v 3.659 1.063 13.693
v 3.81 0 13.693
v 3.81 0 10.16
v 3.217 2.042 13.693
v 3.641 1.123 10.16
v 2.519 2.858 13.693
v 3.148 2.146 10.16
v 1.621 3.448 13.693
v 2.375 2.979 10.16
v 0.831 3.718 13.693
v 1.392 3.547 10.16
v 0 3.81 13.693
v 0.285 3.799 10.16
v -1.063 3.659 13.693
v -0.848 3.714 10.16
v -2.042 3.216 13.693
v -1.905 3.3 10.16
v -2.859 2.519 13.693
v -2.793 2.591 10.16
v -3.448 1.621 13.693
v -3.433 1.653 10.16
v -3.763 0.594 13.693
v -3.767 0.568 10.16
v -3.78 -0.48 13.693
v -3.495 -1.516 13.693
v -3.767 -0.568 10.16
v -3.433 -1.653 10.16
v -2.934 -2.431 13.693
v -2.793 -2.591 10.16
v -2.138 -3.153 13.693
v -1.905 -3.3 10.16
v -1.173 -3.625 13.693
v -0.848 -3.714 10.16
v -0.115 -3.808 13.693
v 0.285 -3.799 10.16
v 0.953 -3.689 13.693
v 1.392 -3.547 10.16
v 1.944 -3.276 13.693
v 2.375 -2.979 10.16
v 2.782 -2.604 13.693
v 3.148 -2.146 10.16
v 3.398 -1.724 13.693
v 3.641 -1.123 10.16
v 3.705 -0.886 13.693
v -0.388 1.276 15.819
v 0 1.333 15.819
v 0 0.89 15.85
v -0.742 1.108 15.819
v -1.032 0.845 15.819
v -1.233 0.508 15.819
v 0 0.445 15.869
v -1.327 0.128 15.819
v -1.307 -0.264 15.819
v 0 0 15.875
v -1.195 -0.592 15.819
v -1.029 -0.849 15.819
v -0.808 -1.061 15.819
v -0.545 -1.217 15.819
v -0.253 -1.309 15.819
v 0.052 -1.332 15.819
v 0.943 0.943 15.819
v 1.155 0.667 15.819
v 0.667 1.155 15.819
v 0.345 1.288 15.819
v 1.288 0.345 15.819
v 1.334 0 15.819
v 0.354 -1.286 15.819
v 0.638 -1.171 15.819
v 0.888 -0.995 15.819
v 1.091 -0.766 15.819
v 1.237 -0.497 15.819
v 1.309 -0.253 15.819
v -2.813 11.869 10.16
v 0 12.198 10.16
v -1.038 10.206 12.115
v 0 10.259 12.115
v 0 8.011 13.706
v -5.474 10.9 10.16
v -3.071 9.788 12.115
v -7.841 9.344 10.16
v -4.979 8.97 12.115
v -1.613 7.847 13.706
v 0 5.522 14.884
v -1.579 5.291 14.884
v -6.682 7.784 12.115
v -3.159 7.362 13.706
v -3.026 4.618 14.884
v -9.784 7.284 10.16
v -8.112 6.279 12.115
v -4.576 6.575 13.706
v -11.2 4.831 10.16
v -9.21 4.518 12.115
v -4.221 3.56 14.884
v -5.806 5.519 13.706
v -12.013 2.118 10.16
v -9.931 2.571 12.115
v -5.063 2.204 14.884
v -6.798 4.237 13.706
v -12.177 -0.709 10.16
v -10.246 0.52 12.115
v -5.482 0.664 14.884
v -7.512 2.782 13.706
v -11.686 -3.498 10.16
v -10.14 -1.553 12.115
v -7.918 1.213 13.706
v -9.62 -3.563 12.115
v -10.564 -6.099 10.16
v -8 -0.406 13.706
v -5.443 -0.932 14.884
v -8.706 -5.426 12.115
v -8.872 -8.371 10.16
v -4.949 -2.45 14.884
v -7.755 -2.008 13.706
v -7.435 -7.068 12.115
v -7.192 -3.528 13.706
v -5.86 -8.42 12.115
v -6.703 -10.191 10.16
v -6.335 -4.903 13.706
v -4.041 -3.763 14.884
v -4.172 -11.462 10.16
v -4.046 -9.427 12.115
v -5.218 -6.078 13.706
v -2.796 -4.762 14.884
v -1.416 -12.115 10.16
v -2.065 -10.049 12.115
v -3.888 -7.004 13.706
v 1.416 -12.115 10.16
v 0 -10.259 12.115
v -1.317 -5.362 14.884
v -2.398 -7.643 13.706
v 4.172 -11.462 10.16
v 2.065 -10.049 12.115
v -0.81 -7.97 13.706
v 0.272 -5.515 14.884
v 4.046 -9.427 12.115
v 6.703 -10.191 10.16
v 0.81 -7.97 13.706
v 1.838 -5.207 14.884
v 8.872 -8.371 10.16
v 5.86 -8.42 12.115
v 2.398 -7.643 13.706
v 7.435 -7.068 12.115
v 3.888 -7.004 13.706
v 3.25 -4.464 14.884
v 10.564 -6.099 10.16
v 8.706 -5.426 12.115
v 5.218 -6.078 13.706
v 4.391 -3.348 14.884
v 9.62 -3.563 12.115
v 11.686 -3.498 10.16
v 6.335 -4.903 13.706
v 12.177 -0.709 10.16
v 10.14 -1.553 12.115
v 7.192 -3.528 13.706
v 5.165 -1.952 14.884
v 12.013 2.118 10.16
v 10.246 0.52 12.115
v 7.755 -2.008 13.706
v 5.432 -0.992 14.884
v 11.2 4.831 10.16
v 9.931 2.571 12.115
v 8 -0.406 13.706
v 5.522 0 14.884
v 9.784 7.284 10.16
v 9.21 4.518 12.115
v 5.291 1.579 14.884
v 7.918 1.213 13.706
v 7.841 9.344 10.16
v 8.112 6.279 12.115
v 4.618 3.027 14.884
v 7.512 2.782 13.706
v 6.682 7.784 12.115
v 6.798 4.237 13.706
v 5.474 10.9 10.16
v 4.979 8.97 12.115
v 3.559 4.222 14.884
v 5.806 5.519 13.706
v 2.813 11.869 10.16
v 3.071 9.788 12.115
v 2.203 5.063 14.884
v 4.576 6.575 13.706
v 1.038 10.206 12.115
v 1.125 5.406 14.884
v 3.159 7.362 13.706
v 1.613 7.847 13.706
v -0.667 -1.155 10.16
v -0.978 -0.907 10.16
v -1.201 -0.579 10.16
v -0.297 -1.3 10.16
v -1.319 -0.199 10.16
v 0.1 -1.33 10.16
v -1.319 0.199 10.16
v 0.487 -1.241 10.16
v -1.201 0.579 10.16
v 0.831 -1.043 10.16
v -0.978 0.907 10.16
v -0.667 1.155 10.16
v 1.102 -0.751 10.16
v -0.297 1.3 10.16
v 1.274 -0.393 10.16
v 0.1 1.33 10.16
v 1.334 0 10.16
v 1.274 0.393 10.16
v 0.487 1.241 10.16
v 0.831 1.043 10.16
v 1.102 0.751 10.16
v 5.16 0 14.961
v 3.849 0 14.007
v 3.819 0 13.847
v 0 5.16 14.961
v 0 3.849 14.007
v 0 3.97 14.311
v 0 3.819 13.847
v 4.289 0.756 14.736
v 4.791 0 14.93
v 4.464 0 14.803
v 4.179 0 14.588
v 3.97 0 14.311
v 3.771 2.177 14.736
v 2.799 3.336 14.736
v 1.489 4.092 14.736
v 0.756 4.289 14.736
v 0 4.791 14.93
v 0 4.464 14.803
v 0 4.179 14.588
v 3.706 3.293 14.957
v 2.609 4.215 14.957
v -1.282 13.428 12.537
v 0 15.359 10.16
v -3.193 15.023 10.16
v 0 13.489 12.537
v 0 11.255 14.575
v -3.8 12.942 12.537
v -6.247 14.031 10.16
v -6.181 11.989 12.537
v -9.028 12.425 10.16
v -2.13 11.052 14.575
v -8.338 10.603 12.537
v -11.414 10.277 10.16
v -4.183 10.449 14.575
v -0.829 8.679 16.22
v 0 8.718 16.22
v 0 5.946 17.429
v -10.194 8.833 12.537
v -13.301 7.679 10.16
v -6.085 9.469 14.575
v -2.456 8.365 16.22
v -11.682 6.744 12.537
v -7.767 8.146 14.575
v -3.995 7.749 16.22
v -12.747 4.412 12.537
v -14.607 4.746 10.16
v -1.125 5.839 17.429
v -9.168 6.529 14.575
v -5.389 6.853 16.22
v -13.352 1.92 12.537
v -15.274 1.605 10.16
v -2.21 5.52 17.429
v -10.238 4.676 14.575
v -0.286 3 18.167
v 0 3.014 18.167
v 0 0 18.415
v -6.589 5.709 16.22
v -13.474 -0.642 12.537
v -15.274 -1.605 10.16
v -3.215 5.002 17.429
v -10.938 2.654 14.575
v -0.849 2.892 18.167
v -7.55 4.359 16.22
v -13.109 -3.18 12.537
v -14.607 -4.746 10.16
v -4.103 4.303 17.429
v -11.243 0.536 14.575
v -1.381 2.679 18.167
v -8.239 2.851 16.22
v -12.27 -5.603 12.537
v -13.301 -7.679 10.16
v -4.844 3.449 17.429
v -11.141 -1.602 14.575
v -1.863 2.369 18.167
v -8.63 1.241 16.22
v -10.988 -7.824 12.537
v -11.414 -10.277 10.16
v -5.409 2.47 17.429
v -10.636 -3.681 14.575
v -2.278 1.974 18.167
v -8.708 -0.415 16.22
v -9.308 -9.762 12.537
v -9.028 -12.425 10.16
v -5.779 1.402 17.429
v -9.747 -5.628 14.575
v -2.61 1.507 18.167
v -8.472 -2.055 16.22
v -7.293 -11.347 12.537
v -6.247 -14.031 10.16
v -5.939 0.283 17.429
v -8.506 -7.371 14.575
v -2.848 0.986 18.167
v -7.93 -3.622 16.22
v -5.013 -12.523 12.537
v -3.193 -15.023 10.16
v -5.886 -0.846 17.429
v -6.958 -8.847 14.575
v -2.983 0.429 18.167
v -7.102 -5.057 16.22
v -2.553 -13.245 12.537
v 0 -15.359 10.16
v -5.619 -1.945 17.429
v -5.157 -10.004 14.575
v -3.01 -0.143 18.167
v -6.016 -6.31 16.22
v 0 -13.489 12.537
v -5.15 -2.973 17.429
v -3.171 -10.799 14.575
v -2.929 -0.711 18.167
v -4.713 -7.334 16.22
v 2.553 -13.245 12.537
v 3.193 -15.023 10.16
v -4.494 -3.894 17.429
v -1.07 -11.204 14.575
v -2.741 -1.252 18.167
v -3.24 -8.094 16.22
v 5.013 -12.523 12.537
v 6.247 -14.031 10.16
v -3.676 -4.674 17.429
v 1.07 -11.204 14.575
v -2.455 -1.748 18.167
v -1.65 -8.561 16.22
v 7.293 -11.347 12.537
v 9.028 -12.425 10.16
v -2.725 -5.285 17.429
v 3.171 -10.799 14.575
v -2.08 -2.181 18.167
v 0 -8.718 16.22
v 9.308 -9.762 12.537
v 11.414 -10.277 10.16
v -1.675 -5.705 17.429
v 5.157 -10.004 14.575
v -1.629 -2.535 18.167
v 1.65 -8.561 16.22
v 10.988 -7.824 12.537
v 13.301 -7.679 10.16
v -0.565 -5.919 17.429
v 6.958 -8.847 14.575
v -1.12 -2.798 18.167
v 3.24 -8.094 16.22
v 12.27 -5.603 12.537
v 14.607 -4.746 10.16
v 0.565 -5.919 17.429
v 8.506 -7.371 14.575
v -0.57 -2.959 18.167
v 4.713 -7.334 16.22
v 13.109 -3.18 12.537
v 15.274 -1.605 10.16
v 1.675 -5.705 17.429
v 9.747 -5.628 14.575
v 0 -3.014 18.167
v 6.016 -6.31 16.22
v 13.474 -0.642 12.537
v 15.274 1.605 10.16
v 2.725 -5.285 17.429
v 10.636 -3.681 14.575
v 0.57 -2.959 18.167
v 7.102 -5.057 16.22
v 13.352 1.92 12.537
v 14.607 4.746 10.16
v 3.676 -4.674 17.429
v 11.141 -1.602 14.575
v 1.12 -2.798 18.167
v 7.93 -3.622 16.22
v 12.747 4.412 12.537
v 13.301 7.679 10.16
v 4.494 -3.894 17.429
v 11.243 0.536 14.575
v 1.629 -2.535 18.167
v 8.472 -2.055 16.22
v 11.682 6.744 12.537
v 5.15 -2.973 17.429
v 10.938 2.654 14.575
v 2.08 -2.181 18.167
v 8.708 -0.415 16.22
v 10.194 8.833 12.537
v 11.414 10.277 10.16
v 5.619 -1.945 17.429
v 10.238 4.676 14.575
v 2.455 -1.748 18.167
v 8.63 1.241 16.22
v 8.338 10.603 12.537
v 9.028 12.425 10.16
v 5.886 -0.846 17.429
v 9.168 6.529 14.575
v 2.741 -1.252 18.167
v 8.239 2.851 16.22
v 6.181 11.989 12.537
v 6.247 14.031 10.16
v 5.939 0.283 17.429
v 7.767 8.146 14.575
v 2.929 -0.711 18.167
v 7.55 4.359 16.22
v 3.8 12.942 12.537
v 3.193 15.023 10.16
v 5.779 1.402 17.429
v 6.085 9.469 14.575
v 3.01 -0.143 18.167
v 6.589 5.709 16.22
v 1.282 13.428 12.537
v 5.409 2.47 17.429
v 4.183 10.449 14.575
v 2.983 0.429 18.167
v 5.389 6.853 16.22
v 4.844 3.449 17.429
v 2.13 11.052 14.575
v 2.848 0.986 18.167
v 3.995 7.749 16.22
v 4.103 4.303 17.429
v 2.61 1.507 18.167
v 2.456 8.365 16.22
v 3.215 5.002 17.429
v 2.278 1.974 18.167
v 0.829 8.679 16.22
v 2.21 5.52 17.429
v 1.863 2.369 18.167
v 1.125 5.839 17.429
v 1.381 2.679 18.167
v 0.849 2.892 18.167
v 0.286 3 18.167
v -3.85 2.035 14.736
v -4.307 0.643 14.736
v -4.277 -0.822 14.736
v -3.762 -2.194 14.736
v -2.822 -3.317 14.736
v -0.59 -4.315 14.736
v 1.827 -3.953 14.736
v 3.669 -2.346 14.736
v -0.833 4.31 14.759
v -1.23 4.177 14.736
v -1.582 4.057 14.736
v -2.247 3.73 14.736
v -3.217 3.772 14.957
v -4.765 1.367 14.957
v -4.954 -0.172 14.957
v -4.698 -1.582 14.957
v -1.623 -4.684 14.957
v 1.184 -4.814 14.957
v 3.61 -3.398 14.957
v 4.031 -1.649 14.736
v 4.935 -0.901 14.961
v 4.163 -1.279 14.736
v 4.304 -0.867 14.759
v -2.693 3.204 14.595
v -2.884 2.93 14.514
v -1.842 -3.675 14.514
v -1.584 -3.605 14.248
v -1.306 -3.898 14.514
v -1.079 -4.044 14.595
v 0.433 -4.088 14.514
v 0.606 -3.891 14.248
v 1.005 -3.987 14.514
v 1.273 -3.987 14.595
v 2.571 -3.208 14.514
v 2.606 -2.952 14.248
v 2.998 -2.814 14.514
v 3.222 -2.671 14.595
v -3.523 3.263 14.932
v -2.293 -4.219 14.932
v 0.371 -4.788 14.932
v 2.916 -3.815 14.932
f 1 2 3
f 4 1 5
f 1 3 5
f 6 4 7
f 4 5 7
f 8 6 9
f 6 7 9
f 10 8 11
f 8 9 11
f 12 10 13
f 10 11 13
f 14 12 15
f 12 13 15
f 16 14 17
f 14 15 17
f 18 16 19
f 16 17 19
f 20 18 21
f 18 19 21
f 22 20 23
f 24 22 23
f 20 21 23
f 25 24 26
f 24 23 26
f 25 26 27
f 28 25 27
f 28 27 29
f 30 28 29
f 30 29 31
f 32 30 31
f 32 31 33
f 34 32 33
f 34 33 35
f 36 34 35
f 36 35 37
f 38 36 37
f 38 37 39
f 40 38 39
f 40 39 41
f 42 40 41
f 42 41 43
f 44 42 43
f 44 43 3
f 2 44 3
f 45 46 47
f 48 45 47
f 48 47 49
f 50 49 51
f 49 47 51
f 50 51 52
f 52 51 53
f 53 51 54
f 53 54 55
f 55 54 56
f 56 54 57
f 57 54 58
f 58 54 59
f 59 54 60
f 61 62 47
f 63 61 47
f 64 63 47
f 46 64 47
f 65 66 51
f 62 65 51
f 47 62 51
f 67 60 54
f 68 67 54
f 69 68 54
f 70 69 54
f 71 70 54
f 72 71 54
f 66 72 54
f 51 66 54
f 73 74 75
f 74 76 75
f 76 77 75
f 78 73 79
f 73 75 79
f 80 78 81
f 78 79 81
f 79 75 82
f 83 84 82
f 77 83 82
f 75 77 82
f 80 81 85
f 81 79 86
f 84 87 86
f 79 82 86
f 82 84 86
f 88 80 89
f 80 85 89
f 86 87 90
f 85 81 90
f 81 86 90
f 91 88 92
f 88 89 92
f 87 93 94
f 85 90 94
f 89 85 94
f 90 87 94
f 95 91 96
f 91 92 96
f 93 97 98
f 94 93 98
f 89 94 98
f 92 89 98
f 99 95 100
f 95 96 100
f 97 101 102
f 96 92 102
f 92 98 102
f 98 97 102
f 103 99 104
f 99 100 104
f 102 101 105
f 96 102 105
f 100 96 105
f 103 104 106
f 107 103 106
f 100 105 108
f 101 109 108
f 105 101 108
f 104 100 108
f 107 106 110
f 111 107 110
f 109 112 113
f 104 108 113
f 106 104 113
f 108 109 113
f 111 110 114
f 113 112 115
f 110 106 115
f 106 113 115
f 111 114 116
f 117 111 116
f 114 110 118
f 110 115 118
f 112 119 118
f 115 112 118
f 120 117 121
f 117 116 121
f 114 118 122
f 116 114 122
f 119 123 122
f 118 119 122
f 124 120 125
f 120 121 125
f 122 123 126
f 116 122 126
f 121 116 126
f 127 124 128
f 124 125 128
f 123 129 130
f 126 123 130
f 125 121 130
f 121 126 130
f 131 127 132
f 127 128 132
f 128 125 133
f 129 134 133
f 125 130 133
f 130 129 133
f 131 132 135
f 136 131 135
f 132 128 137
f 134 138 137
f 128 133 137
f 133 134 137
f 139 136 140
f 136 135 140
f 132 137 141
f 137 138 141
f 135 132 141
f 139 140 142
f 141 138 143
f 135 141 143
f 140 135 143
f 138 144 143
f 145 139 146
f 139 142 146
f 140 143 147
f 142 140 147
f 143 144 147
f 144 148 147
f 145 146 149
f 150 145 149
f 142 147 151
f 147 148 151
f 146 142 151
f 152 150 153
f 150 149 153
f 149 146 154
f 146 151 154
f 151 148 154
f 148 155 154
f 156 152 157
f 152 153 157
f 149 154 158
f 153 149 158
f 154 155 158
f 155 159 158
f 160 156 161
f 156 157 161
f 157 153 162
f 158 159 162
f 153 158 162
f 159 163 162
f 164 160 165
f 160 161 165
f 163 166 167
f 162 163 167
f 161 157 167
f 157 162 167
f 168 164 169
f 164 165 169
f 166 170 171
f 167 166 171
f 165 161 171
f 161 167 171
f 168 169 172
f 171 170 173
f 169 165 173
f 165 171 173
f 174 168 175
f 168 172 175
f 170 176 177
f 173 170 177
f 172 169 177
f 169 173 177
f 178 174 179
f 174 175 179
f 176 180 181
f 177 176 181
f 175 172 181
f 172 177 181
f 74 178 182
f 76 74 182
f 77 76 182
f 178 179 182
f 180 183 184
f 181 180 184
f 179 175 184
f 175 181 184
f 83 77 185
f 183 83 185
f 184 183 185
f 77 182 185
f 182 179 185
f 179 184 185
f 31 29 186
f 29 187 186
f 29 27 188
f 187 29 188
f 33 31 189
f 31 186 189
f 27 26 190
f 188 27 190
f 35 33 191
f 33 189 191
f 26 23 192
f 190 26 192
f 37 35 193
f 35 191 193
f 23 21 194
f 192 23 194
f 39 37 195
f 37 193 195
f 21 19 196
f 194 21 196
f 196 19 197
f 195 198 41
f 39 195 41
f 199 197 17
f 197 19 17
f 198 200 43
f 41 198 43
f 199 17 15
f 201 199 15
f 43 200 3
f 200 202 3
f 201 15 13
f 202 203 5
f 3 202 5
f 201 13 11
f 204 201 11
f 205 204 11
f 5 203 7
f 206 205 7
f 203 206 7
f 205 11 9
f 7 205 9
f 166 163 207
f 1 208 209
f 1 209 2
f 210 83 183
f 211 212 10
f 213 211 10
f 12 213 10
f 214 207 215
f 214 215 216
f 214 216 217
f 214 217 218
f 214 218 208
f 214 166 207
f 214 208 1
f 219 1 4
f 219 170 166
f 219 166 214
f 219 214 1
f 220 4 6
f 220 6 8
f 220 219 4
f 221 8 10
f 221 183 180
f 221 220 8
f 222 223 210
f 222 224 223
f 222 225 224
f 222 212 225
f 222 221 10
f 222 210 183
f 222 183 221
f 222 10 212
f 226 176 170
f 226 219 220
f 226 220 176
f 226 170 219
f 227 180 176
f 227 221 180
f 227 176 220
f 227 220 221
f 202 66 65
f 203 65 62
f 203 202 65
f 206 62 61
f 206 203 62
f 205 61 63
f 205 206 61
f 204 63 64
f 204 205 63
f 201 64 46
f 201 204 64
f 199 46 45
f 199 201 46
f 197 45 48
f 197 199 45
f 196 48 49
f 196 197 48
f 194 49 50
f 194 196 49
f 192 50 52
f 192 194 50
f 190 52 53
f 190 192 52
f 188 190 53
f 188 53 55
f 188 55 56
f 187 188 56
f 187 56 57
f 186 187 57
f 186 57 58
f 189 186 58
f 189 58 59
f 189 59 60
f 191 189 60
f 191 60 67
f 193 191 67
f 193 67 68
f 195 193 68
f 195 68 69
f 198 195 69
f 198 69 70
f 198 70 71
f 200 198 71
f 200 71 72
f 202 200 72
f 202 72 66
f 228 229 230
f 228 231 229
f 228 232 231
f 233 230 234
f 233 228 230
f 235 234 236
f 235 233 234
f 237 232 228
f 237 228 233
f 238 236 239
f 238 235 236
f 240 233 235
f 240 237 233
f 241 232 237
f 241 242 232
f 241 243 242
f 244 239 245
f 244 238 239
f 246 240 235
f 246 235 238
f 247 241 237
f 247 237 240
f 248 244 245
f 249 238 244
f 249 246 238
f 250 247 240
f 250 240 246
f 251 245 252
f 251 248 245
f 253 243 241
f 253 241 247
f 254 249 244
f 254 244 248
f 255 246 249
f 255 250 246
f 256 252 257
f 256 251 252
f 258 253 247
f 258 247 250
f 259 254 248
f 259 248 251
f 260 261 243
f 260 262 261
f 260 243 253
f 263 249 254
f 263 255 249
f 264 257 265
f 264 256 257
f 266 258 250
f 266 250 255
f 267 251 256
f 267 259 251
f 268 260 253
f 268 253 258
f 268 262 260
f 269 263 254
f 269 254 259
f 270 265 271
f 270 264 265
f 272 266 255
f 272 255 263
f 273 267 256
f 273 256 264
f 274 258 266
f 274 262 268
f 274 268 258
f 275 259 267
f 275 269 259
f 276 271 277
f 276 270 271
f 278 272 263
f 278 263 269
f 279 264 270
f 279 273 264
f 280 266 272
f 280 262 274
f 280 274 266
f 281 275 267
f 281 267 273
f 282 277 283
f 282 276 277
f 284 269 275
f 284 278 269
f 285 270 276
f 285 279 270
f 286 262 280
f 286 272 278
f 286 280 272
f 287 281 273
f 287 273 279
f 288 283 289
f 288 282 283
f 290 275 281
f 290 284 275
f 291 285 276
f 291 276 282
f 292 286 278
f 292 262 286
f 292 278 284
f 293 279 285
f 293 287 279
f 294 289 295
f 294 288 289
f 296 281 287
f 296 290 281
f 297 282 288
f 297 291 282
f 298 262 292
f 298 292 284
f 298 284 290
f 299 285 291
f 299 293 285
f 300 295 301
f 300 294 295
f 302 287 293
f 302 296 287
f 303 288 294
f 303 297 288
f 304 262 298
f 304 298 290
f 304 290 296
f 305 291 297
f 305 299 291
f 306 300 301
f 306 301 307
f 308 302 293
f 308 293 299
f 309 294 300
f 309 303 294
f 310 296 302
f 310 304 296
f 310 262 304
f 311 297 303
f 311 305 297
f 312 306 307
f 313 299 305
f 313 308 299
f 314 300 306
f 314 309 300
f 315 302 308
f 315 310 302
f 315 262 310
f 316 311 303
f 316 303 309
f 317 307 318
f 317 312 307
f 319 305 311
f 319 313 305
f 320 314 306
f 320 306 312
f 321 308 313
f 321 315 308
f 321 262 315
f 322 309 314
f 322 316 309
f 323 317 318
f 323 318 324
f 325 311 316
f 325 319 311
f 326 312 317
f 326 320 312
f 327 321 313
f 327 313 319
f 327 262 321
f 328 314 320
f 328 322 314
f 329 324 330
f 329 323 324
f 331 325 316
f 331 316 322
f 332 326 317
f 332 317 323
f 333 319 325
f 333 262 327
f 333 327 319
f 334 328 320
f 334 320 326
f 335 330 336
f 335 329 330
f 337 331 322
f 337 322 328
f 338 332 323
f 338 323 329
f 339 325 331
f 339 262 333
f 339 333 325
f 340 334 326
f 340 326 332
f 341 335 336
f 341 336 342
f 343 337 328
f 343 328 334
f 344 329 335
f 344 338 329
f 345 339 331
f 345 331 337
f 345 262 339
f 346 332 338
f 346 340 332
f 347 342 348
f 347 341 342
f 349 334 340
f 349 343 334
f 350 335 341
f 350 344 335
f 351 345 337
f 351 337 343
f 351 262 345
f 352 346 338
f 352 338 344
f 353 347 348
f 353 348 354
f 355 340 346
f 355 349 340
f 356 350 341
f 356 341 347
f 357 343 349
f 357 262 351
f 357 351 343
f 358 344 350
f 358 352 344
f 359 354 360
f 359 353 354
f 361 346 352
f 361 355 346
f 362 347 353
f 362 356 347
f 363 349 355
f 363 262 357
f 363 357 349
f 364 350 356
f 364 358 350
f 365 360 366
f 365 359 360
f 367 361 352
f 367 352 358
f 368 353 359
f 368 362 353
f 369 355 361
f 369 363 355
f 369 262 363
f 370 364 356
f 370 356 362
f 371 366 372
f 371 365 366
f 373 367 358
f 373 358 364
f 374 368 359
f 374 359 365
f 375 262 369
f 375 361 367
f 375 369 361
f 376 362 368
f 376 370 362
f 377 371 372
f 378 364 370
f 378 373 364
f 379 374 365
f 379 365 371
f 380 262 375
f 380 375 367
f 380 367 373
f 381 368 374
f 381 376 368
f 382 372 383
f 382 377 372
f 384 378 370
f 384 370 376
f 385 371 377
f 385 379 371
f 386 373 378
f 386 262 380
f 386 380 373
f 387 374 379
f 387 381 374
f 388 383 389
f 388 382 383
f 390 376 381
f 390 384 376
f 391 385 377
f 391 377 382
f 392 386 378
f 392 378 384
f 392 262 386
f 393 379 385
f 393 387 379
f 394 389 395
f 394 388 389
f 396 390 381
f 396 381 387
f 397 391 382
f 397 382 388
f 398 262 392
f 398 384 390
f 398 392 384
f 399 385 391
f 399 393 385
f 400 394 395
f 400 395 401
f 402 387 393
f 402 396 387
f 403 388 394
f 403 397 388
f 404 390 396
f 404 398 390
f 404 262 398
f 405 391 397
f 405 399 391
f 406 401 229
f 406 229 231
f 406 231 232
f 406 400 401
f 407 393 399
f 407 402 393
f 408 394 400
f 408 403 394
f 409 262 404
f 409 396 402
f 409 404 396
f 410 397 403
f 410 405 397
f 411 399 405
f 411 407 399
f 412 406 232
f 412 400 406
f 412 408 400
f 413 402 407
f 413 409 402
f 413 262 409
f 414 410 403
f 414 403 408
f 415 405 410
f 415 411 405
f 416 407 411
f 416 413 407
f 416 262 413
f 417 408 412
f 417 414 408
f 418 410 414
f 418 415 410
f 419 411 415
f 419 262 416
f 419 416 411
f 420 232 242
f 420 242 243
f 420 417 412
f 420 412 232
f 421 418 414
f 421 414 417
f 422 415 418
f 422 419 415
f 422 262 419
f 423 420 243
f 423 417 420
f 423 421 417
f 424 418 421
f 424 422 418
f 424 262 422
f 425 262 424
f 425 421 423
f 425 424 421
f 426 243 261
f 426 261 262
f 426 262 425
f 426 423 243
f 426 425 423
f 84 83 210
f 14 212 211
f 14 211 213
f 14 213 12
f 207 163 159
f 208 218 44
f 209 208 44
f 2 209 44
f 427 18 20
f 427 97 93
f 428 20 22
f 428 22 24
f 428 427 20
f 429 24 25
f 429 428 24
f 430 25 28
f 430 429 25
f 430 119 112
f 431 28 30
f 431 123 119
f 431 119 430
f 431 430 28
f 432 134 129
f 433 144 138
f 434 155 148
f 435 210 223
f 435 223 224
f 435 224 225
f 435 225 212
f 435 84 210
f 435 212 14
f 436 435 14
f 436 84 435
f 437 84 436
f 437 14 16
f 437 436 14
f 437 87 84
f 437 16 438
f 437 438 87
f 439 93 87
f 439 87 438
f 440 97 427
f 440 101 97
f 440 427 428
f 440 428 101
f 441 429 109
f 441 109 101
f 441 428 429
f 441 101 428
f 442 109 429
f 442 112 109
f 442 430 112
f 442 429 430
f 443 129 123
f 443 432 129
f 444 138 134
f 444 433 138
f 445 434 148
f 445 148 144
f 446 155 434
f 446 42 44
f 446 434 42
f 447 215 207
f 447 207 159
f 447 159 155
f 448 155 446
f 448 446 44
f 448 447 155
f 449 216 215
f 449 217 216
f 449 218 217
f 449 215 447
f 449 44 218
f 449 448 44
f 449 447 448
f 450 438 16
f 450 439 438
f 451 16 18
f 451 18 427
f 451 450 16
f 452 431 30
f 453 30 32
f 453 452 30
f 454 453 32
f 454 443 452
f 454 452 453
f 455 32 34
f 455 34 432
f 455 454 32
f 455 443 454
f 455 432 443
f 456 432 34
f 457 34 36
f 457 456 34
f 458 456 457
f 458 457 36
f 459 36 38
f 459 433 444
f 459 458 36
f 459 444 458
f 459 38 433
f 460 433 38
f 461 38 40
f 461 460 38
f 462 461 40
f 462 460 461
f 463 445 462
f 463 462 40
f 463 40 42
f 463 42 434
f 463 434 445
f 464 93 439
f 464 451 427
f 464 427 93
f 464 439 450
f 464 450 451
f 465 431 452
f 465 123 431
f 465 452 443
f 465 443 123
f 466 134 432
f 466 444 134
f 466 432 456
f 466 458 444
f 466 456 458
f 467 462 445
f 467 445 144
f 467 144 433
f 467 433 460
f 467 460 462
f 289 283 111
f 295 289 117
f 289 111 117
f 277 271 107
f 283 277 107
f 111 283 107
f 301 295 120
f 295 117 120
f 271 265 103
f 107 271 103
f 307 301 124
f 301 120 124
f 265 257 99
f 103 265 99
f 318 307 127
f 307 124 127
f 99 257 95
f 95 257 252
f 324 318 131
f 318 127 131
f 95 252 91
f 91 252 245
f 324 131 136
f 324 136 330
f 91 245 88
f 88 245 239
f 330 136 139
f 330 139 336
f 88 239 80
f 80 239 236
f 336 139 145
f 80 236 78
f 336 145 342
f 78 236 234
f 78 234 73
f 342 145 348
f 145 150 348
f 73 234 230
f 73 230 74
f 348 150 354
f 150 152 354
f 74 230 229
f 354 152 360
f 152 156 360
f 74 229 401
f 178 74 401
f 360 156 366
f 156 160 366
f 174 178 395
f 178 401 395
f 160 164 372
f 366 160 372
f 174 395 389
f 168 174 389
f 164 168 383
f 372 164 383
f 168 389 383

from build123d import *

# Parameters (mm, degrees)
F3_T     = -2.54
F4_R     = 3.81
F4_R_2   = 1.3335
F6_R     = 1.27
F7_R     = 18.415
F8_DEPTH = 10.16


with BuildPart() as f2:
    # F1 (on Right) → F2 (revolve)
    with BuildSketch(Plane.YZ):
        with BuildLine():
            Line((0, 18.415), (0, 0))
            Line((0, 0), (18.415, 0))
            ThreePointArc((18.415, 0), (13.0213713756, 13.0213713756), (0, 18.415))
        make_face()
    revolve(axis=Axis((0, 0, 9.2075), (0, 0, 1)))

    # F3
    f3_openings = [f2.faces().sort_by_distance(p)[0] for p in [
        (0, 0, 0),
    ]]
    offset(amount=F3_T, openings=f3_openings)

    # F4 (on face) → F5 (join, up to the next surface of F2)
    with BuildSketch(Plane.XY):
        Circle(F4_R)
        Circle(F4_R_2, mode=Mode.SUBTRACT)
    extrude(until=Until.NEXT)

    # F6
    f6_edges = [f2.edges().sort_by_distance(p)[0] for p in [
        (-2.694077, -2.694077, 15.41102),
        (2.694077, 2.694077, 15.41102),
    ]]
    fillet(f6_edges, radius=F6_R)

    # F7 (on face) → F8 (cut)
    with BuildSketch(Plane.XY):
        Circle(F7_R)
    extrude(amount=F8_DEPTH, mode=Mode.SUBTRACT)


solid = f2.part
